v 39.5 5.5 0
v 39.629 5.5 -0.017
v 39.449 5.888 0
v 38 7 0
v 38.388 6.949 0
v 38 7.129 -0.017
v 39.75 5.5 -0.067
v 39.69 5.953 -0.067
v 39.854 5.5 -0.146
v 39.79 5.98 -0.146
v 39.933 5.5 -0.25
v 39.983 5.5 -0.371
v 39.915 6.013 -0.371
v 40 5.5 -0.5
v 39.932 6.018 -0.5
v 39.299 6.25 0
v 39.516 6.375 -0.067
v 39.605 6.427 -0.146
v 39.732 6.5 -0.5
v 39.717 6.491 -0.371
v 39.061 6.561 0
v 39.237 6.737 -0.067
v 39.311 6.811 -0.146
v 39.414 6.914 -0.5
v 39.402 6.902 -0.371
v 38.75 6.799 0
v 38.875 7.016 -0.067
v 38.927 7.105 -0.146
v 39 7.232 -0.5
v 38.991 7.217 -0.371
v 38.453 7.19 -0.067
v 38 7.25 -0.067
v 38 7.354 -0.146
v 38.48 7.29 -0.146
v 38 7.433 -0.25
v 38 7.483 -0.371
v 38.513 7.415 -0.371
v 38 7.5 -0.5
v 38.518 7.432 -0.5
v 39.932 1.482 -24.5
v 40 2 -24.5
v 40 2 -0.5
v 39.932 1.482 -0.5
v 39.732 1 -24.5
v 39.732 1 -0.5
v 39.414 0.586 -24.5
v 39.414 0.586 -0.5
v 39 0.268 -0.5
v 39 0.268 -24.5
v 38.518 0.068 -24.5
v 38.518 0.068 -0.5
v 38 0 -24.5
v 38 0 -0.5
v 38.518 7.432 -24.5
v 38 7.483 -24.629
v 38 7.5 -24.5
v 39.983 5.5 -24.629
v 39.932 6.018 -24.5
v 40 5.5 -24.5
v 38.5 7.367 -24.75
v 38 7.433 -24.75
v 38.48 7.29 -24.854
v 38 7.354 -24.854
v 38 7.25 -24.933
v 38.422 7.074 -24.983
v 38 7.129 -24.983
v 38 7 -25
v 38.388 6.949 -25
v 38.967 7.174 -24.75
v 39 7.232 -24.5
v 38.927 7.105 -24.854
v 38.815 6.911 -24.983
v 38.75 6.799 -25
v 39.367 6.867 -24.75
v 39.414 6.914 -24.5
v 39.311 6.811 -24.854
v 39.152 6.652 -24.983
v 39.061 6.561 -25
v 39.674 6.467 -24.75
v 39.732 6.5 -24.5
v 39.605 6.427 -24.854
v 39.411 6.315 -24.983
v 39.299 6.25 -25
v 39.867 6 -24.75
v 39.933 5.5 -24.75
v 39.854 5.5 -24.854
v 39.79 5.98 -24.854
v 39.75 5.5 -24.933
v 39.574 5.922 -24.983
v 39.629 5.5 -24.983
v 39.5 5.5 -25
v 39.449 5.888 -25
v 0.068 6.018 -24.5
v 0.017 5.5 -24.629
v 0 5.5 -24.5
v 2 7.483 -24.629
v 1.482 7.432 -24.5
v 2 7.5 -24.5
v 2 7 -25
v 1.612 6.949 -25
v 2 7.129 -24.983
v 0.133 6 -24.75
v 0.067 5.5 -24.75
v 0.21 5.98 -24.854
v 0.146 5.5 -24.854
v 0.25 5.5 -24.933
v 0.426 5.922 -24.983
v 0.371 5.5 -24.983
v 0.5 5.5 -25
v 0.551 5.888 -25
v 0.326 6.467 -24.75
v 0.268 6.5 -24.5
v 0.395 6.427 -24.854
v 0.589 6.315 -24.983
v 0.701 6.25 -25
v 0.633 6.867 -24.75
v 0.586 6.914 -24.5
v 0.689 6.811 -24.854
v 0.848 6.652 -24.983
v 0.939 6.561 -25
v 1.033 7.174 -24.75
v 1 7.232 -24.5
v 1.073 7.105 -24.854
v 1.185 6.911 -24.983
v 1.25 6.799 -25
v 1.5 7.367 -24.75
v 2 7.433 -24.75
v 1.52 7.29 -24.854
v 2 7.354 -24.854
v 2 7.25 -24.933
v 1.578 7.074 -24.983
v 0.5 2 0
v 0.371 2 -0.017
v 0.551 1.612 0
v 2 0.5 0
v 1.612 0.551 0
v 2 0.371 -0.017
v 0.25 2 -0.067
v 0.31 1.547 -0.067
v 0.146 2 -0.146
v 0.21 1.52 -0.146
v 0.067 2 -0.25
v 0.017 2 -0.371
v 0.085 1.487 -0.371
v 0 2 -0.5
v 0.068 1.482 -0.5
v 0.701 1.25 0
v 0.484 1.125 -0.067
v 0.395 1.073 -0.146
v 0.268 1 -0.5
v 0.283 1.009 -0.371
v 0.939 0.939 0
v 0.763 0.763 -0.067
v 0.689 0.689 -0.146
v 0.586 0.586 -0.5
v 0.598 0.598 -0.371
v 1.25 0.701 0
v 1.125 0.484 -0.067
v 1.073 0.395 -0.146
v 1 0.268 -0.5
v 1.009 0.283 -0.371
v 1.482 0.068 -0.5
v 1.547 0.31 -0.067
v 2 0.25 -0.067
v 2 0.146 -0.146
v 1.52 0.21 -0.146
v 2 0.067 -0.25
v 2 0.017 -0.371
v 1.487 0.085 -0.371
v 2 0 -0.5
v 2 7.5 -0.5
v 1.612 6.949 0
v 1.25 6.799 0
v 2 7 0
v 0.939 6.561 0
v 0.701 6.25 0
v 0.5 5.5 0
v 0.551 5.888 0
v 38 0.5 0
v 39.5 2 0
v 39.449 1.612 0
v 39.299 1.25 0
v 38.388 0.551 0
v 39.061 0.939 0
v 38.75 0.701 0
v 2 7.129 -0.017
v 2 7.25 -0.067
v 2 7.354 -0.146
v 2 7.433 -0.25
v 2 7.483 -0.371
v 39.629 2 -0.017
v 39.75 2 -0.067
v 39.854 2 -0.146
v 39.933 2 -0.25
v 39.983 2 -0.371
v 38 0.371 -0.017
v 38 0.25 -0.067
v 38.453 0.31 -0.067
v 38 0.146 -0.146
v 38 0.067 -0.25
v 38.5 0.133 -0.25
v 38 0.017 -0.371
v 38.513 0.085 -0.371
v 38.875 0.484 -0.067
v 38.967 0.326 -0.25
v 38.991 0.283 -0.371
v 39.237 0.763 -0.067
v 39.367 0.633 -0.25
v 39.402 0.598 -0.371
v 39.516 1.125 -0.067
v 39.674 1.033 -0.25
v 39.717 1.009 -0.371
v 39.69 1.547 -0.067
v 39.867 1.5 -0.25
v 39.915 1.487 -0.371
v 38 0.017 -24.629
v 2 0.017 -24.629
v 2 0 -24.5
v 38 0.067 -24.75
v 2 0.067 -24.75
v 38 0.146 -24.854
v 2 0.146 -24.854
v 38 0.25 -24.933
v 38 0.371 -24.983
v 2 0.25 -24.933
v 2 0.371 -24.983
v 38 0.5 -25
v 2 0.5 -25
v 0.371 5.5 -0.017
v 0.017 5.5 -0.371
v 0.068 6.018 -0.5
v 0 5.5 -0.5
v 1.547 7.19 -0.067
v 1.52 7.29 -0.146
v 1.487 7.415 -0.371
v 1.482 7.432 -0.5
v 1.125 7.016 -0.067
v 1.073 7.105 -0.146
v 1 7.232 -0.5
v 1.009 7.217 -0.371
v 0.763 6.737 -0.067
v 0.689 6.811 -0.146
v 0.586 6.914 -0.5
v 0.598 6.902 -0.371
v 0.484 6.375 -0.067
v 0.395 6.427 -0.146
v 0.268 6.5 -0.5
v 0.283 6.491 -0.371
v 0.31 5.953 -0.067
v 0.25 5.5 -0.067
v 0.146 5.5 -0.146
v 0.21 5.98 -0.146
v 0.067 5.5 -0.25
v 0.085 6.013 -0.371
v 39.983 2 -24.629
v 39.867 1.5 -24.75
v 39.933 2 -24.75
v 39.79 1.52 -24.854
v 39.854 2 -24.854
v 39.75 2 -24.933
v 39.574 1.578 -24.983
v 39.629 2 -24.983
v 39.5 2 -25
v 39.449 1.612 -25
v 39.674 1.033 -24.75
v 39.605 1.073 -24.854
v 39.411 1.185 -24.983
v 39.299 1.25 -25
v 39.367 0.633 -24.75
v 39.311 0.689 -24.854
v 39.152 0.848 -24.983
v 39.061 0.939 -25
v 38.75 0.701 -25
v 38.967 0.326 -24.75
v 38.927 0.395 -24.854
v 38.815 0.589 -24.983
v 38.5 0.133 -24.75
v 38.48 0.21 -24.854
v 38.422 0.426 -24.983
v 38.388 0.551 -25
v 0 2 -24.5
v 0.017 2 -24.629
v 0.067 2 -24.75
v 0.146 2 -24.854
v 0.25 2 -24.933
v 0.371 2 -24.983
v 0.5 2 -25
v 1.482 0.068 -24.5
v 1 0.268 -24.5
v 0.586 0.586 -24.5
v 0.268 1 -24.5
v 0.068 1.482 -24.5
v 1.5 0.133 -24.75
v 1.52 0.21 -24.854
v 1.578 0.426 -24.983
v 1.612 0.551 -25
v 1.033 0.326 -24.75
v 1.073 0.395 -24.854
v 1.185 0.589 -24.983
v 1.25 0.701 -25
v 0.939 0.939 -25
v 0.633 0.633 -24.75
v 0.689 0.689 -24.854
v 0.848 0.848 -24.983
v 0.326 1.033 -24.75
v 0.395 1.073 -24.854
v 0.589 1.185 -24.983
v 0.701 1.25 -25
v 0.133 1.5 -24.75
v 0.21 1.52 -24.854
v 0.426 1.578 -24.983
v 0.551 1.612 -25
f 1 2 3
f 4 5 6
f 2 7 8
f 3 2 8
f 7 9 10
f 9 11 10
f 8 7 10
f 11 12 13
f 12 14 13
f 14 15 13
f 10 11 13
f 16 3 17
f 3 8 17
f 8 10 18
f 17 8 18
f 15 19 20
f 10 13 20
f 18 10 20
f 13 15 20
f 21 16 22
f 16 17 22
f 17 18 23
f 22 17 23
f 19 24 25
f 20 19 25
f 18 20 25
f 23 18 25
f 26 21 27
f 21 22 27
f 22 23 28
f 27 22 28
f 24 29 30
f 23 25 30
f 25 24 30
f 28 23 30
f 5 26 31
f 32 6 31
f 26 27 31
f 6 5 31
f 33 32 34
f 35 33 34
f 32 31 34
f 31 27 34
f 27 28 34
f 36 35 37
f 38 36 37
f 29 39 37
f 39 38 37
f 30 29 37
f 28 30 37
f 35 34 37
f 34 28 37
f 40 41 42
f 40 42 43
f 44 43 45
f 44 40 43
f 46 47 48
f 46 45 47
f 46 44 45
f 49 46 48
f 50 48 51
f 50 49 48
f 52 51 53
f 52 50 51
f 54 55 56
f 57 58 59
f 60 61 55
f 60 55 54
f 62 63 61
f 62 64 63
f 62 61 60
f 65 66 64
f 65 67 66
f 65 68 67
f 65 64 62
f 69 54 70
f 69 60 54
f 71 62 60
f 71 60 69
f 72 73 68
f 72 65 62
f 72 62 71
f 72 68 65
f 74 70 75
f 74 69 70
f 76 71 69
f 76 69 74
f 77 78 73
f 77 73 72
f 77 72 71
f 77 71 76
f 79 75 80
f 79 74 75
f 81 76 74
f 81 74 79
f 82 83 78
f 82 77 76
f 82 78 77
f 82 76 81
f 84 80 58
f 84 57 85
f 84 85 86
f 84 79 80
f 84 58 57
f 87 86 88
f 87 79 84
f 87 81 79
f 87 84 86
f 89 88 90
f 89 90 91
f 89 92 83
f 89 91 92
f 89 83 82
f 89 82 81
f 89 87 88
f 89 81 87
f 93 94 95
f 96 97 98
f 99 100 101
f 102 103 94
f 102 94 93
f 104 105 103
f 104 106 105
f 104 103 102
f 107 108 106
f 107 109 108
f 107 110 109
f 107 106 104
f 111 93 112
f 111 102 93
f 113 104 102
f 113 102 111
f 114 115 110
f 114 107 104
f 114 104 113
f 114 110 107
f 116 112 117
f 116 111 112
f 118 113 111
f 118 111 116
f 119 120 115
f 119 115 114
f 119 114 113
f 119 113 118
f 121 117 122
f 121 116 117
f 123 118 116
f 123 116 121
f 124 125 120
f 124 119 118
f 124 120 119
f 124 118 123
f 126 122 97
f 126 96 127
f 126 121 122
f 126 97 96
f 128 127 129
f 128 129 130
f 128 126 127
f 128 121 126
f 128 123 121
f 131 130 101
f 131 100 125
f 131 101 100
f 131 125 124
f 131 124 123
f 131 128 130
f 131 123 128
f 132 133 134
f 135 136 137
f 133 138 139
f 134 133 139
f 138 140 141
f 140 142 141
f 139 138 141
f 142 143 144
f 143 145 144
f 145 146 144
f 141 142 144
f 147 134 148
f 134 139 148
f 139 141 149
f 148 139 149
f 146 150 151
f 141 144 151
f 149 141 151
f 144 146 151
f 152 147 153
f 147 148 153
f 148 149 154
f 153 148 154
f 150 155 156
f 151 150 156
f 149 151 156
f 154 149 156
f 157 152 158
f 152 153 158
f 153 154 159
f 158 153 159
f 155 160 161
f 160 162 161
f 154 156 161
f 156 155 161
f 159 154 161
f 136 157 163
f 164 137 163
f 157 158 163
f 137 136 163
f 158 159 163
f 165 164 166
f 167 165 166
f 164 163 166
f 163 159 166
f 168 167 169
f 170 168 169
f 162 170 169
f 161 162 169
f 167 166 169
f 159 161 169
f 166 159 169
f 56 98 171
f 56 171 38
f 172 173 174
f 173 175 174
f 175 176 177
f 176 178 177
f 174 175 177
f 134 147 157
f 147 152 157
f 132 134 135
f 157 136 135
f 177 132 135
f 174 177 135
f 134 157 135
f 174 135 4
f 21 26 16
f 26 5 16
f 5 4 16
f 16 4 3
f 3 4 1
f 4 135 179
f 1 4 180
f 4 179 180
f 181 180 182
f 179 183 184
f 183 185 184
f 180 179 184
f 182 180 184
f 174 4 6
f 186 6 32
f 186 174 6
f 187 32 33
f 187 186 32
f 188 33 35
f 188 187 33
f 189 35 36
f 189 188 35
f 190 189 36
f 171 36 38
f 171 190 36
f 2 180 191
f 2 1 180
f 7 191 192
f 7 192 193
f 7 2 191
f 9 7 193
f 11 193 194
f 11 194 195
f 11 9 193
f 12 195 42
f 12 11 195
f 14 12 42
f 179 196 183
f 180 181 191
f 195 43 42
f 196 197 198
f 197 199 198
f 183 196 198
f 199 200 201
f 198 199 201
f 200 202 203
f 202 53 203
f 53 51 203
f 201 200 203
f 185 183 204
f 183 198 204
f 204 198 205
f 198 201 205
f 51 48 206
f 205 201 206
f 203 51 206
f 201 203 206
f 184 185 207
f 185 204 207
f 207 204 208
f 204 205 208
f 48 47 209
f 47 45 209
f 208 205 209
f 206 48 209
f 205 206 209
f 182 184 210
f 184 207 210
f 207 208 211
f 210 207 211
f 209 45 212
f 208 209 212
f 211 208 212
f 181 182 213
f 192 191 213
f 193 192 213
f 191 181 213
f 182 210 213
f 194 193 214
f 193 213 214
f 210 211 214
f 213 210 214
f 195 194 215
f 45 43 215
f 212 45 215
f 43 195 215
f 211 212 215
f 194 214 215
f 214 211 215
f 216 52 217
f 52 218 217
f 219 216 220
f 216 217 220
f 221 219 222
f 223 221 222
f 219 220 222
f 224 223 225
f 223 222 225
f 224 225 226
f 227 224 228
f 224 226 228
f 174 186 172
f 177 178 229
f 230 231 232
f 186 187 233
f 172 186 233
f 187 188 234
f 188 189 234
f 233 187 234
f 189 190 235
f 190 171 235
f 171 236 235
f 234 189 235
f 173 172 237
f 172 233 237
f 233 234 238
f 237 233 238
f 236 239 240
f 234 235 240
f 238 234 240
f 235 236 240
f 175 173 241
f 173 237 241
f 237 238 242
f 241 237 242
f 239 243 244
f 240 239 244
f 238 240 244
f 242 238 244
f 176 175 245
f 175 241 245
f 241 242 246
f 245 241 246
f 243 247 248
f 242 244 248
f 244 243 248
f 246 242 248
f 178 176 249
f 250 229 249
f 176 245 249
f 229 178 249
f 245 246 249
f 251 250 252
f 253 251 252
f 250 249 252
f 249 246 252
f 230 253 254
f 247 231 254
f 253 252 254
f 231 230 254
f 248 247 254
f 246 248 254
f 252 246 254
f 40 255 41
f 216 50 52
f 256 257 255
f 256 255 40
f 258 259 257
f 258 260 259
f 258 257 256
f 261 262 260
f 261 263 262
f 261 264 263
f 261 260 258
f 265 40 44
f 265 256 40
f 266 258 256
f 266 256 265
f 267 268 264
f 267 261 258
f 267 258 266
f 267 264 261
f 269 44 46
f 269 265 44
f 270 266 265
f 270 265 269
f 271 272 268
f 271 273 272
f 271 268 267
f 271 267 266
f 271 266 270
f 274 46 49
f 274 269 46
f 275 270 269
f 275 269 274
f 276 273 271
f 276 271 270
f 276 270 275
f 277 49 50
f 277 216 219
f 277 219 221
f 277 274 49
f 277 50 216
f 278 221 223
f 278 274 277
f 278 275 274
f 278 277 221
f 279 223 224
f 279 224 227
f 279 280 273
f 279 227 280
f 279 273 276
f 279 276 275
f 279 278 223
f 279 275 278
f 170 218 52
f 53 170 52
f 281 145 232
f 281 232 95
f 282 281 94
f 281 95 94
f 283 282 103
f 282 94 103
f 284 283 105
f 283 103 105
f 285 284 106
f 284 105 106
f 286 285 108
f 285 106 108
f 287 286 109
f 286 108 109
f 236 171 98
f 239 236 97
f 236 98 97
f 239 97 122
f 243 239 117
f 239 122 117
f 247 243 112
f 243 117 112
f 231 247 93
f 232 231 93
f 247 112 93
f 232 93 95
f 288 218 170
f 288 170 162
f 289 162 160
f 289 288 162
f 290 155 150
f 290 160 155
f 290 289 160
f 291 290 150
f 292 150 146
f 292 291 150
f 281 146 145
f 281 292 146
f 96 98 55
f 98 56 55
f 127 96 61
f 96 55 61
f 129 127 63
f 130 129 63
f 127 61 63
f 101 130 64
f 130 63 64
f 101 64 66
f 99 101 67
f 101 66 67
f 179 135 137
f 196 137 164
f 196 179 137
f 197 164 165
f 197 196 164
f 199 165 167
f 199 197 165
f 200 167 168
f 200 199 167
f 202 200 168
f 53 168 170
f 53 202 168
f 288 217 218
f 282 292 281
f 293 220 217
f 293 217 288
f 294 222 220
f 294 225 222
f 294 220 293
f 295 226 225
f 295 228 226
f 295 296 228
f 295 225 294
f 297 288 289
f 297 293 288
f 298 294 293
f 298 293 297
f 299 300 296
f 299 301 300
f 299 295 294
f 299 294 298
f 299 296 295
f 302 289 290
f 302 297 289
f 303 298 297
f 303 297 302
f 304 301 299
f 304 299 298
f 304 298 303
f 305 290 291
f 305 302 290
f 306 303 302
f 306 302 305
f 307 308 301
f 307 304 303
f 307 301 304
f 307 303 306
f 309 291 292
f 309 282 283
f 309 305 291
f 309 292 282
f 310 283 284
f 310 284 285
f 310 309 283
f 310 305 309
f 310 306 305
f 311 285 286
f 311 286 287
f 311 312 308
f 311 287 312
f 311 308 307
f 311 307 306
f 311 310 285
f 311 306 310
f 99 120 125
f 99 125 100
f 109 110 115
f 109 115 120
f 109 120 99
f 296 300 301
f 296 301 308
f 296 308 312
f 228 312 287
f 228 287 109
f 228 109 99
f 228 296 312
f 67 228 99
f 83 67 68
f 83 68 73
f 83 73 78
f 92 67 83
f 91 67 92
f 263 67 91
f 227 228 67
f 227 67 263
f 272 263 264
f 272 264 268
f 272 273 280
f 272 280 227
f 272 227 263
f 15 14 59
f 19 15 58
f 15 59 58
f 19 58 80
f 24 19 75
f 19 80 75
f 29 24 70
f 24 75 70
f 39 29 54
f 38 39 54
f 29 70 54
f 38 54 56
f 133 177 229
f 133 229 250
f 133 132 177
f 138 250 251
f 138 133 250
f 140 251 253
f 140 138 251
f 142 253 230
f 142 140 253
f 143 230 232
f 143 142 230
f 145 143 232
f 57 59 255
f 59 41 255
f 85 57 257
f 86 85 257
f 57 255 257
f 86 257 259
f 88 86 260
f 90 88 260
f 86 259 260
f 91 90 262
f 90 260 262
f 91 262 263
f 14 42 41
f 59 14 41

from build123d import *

# Parameters (mm, degrees)
SKETCH1_W           = 40
SKETCH1_H           = 25
BOSS_EXTRUDE1_DEPTH = 7.5
FILLET2_R           = 2
FILLET3_R           = 2
FILLET4_R           = 2
FILLET5_R           = 0.5
FILLET6_R           = 0.5


with BuildPart() as part:
    # Sketch1 → Boss-Extrude1 (new body)
    with BuildSketch(Plane(origin=(0, 0, 0), x_dir=(1, 0, 0), z_dir=(0, 1, 0))):
        with Locations((20, 12.5)):
            Rectangle(SKETCH1_W, SKETCH1_H)
    extrude(amount=BOSS_EXTRUDE1_DEPTH)

    # Fillet2
    fillet2_edges = [part.edges().sort_by_distance(p)[0] for p in [
        (40, 7.5, -12.5),
    ]]
    fillet(fillet2_edges, radius=FILLET2_R)

    # Fillet3
    fillet3_edges = [part.edges().sort_by_distance(p)[0] for p in [
        (40, 0, -12.5),
    ]]
    fillet(fillet3_edges, radius=FILLET3_R)

    # Fillet4
    fillet4_edges = [part.edges().sort_by_distance(p)[0] for p in [
        (0, 7.5, -12.5),
        (0, 0, -12.5),
    ]]
    fillet(fillet4_edges, radius=FILLET4_R)

    # Fillet5
    fillet5_edges = [part.edges().sort_by_distance(p)[0] for p in [
        (40, 3.75, 0),
        (39.414213562, 6.914213562, 0),
        (39.414213562, 0.585786438, 0),
        (0, 3.75, 0),
        (20, 0, 0),
        (20, 7.5, 0),
        (0.585786438, 6.914213562, 0),
        (0.585786438, 0.585786438, 0),
    ]]
    fillet(fillet5_edges, radius=FILLET5_R)

    # Fillet6
    fillet6_edges = [part.edges().sort_by_distance(p)[0] for p in [
        (20, 7.5, -25),
        (40, 3.75, -25),
        (39.414213562, 6.914213562, -25),
        (20, 0, -25),
        (39.414213562, 0.585786438, -25),
        (0, 3.75, -25),
        (0.585786438, 6.914213562, -25),
        (0.585786438, 0.585786438, -25),
    ]]
    fillet(fillet6_edges, radius=FILLET6_R)


solid = part.part
